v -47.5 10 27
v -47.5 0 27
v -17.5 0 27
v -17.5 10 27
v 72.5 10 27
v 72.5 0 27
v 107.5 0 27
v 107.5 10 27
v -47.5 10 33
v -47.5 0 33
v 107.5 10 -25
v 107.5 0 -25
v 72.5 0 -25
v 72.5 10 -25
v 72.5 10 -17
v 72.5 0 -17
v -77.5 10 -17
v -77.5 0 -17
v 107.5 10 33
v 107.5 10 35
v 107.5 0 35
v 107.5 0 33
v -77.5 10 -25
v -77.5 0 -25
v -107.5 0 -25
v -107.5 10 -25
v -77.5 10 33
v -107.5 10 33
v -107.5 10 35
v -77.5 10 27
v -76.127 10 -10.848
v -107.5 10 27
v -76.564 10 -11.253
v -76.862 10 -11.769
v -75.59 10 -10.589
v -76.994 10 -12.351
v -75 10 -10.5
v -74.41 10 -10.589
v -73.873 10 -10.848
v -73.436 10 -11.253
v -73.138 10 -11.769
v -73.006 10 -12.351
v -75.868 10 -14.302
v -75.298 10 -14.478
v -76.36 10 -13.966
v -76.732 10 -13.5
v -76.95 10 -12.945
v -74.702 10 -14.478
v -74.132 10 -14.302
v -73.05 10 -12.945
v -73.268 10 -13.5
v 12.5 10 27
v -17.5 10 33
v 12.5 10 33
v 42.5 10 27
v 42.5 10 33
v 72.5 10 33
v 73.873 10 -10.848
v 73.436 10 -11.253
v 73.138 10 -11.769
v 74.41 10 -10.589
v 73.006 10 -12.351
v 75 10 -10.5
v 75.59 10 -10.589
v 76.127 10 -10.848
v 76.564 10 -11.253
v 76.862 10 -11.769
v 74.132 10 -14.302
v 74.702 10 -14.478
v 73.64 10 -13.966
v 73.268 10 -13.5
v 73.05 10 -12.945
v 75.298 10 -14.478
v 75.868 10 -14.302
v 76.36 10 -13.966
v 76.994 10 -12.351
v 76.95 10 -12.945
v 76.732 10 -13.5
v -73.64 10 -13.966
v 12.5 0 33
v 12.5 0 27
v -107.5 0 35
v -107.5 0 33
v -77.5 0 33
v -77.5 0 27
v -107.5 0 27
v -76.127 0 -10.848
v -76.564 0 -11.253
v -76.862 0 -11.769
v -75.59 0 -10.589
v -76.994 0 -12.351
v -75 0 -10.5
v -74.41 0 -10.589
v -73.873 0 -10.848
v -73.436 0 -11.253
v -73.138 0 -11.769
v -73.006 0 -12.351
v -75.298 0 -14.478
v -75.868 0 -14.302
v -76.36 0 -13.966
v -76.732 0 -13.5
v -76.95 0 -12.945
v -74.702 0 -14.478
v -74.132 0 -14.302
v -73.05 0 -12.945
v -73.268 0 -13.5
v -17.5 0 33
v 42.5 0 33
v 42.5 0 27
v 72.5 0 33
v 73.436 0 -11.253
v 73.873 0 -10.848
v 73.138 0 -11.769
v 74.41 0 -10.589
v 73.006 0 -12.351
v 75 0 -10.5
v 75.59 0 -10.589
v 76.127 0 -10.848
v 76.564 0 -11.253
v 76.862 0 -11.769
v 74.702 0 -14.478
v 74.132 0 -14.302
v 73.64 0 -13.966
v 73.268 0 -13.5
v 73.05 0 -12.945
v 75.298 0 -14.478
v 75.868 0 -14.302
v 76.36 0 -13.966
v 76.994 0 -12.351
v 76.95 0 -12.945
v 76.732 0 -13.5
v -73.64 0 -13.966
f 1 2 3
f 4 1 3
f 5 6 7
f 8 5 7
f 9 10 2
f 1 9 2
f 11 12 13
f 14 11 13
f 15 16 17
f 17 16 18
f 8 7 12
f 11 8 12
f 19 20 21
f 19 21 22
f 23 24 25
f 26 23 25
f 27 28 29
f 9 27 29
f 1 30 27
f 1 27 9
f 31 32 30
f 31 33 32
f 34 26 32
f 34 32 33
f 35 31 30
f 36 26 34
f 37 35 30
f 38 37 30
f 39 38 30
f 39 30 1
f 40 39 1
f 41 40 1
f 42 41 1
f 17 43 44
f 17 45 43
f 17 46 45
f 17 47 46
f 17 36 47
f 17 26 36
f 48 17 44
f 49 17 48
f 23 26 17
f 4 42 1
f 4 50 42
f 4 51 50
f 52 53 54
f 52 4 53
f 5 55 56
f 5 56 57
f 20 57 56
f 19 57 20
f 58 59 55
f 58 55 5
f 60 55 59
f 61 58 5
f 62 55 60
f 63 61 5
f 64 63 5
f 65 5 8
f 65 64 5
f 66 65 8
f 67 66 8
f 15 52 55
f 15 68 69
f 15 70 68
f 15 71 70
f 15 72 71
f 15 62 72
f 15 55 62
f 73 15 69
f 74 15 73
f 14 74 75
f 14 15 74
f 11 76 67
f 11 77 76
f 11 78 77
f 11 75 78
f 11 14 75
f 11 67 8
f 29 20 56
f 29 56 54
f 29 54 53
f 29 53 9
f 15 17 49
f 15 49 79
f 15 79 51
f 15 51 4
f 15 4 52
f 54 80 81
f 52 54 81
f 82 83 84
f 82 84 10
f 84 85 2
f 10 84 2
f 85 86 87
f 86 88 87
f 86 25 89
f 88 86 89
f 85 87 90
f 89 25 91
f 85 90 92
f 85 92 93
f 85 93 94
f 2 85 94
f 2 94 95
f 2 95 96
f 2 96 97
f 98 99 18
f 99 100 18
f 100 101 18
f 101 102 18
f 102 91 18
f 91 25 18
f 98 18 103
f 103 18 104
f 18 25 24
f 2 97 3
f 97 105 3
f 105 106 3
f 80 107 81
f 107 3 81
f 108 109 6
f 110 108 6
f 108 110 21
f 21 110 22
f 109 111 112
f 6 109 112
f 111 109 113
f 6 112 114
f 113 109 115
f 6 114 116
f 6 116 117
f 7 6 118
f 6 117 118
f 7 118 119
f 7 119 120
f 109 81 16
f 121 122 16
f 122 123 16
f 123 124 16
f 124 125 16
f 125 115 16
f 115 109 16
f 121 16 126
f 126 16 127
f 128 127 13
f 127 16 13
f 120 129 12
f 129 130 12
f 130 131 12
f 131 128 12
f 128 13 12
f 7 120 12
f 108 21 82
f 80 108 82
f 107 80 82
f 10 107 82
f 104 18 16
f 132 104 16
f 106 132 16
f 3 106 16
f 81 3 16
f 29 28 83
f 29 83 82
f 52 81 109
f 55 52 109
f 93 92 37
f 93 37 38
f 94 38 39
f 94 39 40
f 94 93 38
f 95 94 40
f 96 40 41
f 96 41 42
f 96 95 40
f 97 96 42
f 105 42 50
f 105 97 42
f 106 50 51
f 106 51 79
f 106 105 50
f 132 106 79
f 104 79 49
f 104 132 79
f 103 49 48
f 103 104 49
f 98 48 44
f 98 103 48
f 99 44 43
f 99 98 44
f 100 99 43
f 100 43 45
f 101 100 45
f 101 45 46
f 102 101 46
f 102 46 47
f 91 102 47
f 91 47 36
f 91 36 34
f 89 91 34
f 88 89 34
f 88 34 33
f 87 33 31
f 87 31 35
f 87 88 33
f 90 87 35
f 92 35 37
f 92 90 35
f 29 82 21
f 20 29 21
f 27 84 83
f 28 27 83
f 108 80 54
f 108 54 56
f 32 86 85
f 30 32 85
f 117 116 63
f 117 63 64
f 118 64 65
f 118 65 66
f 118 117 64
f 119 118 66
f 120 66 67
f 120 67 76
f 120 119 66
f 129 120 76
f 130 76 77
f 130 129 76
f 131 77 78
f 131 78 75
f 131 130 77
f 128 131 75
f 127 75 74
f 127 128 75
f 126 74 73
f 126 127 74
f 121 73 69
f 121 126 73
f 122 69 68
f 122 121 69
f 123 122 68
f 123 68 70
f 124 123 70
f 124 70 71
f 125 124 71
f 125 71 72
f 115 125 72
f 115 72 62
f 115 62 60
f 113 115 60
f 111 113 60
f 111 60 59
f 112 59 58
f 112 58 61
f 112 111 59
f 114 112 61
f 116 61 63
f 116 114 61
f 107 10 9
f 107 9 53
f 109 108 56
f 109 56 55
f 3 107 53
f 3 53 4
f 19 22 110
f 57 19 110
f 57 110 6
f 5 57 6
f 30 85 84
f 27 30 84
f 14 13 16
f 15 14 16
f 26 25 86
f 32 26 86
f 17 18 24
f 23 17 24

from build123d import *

# Parameters (mm, degrees)
SKETCH_1_W      = 30
SKETCH_1_H      = 6
SKETCH_1_R      = 2
EXTRUDE_1_DEPTH = 10


with BuildPart() as part:
    # Эскиз1 → Бобышка-Вытянуть1 (new body)
    with BuildSketch(Plane(origin=(0, 0, 0), x_dir=(1, 0, 0), z_dir=(0, 1, 0))):
        Polygon((-107.5, 25), (-107.5, -25), (-107.5, -27), (-77.5, -27), (-77.5, -33), (-107.5, -33), (-107.5, -35), (107.5, -35), (107.5, -33), (72.5, -33), (72.5, -27), (107.5, -27), (107.5, -25), (107.5, 25), (72.5, 25), (72.5, 17), (-77.5, 17), (-77.5, 25), align=None)
        with Locations((-32.5, -30)):
            Rectangle(SKETCH_1_W, SKETCH_1_H, mode=Mode.SUBTRACT)
        with Locations((27.5, -30)):
            Rectangle(SKETCH_1_W, SKETCH_1_H, mode=Mode.SUBTRACT)
        with Locations((-75, 12.5)):
            Circle(SKETCH_1_R, mode=Mode.SUBTRACT)
        with Locations((75, 12.5)):
            Circle(SKETCH_1_R, mode=Mode.SUBTRACT)
    extrude(amount=EXTRUDE_1_DEPTH)


solid = part.part
